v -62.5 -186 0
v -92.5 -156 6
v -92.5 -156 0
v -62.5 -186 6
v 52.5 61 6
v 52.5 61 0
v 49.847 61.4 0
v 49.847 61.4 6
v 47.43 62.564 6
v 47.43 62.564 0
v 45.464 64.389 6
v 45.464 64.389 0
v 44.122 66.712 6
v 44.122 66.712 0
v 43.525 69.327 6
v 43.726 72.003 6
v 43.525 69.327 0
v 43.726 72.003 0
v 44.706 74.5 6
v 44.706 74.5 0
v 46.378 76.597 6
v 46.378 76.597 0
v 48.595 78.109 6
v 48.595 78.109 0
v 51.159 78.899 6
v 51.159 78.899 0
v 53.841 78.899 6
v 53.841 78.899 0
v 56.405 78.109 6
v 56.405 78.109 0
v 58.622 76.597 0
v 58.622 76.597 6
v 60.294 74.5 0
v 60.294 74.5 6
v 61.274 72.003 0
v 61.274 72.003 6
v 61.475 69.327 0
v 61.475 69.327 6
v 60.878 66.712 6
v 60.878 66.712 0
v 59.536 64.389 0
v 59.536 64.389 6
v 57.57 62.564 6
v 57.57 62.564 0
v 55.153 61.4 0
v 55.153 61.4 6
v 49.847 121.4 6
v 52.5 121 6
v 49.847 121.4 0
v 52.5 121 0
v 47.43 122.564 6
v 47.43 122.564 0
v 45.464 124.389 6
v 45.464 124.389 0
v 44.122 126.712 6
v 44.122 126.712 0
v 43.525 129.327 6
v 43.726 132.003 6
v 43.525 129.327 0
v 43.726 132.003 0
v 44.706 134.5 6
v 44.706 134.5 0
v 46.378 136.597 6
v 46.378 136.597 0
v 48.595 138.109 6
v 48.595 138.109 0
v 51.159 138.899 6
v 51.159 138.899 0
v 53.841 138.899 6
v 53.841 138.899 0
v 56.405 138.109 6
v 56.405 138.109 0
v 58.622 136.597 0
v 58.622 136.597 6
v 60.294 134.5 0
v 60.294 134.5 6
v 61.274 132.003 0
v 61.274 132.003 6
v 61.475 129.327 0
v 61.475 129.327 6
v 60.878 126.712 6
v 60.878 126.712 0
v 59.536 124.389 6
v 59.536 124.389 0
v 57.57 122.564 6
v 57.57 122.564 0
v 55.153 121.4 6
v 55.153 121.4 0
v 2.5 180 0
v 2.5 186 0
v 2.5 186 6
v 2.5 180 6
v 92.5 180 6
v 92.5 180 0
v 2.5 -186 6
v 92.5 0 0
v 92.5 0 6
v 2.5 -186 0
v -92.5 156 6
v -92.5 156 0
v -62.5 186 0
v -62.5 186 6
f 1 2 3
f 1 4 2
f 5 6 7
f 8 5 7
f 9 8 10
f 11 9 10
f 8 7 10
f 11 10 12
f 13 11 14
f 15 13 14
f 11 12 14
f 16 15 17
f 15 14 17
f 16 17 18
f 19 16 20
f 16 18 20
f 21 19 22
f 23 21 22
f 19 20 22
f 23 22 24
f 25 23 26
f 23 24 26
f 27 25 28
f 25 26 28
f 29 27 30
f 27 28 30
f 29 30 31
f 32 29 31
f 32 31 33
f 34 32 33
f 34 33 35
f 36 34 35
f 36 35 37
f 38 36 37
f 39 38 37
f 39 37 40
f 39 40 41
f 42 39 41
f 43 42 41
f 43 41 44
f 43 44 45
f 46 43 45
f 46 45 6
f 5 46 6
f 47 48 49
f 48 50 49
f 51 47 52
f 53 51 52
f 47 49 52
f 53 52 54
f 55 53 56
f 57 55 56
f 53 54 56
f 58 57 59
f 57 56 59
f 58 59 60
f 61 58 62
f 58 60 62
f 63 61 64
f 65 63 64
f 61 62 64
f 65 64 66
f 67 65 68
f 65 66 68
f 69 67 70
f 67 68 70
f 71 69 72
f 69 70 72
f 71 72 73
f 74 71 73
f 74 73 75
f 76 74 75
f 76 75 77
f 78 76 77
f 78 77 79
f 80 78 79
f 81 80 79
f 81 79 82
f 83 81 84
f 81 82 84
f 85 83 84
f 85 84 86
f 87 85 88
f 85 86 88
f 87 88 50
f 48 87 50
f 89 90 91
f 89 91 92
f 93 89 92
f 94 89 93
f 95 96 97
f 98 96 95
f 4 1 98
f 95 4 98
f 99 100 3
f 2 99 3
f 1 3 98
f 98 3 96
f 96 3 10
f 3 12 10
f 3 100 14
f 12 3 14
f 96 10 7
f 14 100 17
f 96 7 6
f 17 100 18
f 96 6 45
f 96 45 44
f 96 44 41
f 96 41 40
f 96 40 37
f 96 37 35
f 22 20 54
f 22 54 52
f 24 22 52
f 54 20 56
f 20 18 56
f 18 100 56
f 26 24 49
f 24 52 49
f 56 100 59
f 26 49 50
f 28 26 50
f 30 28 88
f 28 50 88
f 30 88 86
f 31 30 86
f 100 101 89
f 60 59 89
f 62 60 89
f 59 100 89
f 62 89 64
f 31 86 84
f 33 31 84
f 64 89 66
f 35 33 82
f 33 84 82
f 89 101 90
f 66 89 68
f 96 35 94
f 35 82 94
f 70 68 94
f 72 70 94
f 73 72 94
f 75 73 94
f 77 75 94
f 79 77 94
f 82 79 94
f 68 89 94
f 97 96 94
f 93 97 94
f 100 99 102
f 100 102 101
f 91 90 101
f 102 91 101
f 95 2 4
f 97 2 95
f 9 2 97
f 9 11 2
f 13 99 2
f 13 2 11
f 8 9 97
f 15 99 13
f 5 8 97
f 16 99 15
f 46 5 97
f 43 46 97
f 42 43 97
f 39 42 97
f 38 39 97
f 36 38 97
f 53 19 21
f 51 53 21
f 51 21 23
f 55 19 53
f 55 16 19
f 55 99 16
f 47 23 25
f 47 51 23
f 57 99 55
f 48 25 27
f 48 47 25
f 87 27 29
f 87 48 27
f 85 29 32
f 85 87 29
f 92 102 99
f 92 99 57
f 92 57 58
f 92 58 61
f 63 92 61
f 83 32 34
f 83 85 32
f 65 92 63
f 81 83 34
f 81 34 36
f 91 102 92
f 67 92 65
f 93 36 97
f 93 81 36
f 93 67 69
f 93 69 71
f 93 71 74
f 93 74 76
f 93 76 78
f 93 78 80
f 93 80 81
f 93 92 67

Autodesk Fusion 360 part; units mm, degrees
sketch "スケッチ1" plane through (0, 0, 0) normal (0, 0, 1) x (1, 0, 0)
  line L0 (2.5, 186) -> (-92.5, 186)
  line L1 (-92.5, 186) -> (-92.5, -186)
  line L2 (-92.5, -186) -> (2.5, -186)
  line L3 (92.5, 0) -> (92.5, 180)
  line L4 (89.5161, 180) -> (-92.5, -186) construction
  line L5 (-92.5, 186) -> (46.8836, -94.274) construction
  line L6 (2.5, 186) -> (2.5, 180)
  line L7 (2.5, 180) -> (92.5, 180)
  line L8 (-92.5, -186) -> (2.5, -186) construction
  line L9 (92.5, 0) -> (2.5, -186)
  dimension "d2" = 372
  dimension "d5" = 95
extrude "押し出し1" add sketch "スケッチ1" along normal blind 6
sketch "スケッチ2" plane through (0, 0, 6) normal (0, 0, 1) x (-1, 0, 0)
  line L0 (-2.5, -186) -> (92.5, -186)
  line L1 (92.5, -186) -> (92.5, 186)
  line L2 (92.5, 186) -> (-2.5, 186)
  line L3 (-2.5, 186) -> (-92.5, 0)
  line L4 (-92.5, 0) -> (-92.5, -180)
  line L5 (-92.5, -180) -> (-2.5, -180)
  line L6 (-2.5, -180) -> (-2.5, -186)
  line L7 (-92.5, -180) -> (-52.5, -180) construction
  line L8 (-52.5, -180) -> (-52.5, -130) construction
  line L9 (-52.5, -130) -> (-92.5, -130) construction
  line L10 (-92.5, -130) -> (-92.5, -180) construction
  line L11 (-52.5, -130) -> (-52.5, -70) construction
  point P0 (-52.5, -130)
  point P1 (-52.5, -70)
  dimension "d9" = 40
  dimension "d10" = 50
  dimension "d11" = 60
hole "穴1" at (52.5, 130, 6) at (52.5, 70, 6) direction (0, 0, -1) diameter 18 end through all
chamfer "面取り1" distance 30 angle 45 2 edges at (-92.5, -186, 3) (-92.5, 186, 3)
equation "d5 = 30 mm + 65 mm"
